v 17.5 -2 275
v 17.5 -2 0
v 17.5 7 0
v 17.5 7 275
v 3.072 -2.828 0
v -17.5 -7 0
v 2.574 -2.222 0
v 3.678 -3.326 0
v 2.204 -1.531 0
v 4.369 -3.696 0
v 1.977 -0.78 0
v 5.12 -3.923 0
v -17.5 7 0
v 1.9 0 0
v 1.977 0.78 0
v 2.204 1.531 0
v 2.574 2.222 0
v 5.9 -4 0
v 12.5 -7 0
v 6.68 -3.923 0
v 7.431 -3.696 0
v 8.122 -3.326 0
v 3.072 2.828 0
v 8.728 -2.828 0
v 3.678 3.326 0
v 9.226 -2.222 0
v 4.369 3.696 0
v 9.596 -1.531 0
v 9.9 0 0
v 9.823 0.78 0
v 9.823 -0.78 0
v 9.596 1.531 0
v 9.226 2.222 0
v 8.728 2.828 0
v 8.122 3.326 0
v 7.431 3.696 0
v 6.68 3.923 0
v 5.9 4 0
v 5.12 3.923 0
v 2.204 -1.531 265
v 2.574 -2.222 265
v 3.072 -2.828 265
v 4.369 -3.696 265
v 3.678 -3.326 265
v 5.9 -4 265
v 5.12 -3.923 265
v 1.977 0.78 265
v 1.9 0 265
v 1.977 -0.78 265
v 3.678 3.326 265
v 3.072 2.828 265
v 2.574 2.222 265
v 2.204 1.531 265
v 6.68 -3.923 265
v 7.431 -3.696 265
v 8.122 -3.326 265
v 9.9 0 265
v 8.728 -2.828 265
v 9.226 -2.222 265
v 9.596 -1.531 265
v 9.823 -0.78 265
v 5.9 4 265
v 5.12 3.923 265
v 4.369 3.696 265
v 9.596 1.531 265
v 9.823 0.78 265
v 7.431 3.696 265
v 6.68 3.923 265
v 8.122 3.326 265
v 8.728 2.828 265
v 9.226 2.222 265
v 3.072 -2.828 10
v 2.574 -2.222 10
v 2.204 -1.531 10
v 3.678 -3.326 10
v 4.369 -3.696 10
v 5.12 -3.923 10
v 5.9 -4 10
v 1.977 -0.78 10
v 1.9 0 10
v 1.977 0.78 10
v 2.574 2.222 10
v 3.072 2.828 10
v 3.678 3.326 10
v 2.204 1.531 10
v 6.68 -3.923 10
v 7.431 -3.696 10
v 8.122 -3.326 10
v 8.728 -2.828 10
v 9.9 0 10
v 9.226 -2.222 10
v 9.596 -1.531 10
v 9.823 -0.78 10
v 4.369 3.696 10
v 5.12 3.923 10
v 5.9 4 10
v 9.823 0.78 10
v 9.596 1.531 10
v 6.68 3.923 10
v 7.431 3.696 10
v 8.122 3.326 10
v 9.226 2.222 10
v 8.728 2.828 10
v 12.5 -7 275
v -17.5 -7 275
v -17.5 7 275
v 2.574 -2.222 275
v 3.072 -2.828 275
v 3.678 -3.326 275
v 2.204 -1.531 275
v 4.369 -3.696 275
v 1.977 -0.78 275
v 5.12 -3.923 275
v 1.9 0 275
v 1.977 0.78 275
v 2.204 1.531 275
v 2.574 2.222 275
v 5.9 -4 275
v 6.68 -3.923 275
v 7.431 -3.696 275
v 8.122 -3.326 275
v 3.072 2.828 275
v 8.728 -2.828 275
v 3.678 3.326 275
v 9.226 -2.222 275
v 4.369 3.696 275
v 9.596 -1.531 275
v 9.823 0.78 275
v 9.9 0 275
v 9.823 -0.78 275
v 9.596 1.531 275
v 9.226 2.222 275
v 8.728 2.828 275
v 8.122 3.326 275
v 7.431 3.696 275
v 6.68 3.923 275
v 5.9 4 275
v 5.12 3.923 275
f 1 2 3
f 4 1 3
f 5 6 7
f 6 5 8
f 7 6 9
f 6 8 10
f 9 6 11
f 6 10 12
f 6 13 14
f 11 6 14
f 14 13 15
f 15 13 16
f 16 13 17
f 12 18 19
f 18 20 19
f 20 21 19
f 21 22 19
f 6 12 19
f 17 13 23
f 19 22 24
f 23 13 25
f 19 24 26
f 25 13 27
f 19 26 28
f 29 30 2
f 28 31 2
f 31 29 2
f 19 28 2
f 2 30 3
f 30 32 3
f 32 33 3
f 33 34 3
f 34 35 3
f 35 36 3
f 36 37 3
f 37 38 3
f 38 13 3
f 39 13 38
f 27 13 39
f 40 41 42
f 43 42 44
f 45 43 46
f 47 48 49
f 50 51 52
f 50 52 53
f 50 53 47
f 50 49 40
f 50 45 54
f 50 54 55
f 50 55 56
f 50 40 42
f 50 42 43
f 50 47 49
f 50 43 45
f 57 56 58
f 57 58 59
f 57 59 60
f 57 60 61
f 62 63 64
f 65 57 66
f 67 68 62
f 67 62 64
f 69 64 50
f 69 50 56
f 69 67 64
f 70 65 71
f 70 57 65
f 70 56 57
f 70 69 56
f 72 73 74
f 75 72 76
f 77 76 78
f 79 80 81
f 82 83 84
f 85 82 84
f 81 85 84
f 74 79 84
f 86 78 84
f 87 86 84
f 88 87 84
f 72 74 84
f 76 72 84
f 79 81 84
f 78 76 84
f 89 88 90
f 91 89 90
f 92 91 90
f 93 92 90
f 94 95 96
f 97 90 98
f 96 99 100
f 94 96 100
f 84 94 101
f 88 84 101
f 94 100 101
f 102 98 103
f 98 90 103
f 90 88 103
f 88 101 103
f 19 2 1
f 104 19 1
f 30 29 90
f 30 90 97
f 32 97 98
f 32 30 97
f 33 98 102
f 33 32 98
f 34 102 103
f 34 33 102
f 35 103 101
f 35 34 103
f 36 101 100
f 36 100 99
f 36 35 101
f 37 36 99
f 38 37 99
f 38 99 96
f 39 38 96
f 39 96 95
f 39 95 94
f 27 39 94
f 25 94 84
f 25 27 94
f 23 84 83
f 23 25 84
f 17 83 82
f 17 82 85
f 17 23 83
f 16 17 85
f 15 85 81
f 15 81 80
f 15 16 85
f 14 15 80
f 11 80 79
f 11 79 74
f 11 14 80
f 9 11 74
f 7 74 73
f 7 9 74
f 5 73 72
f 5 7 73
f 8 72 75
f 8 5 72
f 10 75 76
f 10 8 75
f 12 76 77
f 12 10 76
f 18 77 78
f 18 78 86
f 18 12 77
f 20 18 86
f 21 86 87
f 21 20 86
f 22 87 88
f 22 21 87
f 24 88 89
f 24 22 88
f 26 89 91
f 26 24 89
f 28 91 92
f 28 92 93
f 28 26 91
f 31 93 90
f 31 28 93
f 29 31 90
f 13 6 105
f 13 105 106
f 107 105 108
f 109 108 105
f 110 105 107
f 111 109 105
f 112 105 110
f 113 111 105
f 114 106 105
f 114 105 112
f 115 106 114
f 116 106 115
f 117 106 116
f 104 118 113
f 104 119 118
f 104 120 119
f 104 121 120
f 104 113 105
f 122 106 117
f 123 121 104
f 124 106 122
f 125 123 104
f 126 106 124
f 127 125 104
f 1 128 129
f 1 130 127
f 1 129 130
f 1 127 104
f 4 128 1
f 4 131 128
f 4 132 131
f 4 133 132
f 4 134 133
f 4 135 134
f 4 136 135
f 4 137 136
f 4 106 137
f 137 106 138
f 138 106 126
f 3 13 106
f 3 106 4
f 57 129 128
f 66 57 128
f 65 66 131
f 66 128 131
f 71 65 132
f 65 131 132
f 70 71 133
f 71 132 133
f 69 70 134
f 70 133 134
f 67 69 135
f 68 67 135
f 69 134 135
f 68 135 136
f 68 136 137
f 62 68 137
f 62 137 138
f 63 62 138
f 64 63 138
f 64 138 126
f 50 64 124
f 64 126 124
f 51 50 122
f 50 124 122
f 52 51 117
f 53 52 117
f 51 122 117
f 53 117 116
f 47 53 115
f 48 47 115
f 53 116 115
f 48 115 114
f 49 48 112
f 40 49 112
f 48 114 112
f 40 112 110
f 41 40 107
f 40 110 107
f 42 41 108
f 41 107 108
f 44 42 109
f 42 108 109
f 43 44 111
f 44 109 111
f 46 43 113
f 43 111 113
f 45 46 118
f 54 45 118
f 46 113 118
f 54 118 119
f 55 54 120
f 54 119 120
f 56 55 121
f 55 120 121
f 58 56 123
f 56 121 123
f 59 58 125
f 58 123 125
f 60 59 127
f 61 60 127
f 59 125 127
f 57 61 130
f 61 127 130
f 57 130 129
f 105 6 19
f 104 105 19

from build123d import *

# Parameters (mm, degrees)
SKETCH_1_W          = 35
SKETCH_1_H          = 14
EXTRUDE_1_DEPTH     = 275
CHAMFER_1_SIZE      = 5
SKETCH_2_R          = 4
CUT_EXTRUDE_1_DEPTH = 10


with BuildPart() as part:
    # 草图1 → 凸台-拉伸1 (new body)
    with BuildSketch(Plane.XY):
        Rectangle(SKETCH_1_W, SKETCH_1_H)
    extrude(amount=EXTRUDE_1_DEPTH)

    # 倒角1
    chamfer_1_edges = [part.edges().sort_by_distance(p)[0] for p in [
        (17.5, -7, 137.5),
    ]]
    chamfer(chamfer_1_edges, length=CHAMFER_1_SIZE)

    # 草图2 → 切除-拉伸1 (cut)
    with BuildSketch(Plane.XY.offset(275)):
        with Locations((5.9, 0)):
            Circle(SKETCH_2_R)
    cut_extrude_1 = extrude(amount=-CUT_EXTRUDE_1_DEPTH, mode=Mode.SUBTRACT)

    # 镜向1: 切除-拉伸1 across plane
    add(cut_extrude_1.mirror(Plane(origin=(0, 0, 137.5), x_dir=(1, 0, 0), z_dir=(0, 0, -1))), mode=Mode.SUBTRACT)


solid = part.part
